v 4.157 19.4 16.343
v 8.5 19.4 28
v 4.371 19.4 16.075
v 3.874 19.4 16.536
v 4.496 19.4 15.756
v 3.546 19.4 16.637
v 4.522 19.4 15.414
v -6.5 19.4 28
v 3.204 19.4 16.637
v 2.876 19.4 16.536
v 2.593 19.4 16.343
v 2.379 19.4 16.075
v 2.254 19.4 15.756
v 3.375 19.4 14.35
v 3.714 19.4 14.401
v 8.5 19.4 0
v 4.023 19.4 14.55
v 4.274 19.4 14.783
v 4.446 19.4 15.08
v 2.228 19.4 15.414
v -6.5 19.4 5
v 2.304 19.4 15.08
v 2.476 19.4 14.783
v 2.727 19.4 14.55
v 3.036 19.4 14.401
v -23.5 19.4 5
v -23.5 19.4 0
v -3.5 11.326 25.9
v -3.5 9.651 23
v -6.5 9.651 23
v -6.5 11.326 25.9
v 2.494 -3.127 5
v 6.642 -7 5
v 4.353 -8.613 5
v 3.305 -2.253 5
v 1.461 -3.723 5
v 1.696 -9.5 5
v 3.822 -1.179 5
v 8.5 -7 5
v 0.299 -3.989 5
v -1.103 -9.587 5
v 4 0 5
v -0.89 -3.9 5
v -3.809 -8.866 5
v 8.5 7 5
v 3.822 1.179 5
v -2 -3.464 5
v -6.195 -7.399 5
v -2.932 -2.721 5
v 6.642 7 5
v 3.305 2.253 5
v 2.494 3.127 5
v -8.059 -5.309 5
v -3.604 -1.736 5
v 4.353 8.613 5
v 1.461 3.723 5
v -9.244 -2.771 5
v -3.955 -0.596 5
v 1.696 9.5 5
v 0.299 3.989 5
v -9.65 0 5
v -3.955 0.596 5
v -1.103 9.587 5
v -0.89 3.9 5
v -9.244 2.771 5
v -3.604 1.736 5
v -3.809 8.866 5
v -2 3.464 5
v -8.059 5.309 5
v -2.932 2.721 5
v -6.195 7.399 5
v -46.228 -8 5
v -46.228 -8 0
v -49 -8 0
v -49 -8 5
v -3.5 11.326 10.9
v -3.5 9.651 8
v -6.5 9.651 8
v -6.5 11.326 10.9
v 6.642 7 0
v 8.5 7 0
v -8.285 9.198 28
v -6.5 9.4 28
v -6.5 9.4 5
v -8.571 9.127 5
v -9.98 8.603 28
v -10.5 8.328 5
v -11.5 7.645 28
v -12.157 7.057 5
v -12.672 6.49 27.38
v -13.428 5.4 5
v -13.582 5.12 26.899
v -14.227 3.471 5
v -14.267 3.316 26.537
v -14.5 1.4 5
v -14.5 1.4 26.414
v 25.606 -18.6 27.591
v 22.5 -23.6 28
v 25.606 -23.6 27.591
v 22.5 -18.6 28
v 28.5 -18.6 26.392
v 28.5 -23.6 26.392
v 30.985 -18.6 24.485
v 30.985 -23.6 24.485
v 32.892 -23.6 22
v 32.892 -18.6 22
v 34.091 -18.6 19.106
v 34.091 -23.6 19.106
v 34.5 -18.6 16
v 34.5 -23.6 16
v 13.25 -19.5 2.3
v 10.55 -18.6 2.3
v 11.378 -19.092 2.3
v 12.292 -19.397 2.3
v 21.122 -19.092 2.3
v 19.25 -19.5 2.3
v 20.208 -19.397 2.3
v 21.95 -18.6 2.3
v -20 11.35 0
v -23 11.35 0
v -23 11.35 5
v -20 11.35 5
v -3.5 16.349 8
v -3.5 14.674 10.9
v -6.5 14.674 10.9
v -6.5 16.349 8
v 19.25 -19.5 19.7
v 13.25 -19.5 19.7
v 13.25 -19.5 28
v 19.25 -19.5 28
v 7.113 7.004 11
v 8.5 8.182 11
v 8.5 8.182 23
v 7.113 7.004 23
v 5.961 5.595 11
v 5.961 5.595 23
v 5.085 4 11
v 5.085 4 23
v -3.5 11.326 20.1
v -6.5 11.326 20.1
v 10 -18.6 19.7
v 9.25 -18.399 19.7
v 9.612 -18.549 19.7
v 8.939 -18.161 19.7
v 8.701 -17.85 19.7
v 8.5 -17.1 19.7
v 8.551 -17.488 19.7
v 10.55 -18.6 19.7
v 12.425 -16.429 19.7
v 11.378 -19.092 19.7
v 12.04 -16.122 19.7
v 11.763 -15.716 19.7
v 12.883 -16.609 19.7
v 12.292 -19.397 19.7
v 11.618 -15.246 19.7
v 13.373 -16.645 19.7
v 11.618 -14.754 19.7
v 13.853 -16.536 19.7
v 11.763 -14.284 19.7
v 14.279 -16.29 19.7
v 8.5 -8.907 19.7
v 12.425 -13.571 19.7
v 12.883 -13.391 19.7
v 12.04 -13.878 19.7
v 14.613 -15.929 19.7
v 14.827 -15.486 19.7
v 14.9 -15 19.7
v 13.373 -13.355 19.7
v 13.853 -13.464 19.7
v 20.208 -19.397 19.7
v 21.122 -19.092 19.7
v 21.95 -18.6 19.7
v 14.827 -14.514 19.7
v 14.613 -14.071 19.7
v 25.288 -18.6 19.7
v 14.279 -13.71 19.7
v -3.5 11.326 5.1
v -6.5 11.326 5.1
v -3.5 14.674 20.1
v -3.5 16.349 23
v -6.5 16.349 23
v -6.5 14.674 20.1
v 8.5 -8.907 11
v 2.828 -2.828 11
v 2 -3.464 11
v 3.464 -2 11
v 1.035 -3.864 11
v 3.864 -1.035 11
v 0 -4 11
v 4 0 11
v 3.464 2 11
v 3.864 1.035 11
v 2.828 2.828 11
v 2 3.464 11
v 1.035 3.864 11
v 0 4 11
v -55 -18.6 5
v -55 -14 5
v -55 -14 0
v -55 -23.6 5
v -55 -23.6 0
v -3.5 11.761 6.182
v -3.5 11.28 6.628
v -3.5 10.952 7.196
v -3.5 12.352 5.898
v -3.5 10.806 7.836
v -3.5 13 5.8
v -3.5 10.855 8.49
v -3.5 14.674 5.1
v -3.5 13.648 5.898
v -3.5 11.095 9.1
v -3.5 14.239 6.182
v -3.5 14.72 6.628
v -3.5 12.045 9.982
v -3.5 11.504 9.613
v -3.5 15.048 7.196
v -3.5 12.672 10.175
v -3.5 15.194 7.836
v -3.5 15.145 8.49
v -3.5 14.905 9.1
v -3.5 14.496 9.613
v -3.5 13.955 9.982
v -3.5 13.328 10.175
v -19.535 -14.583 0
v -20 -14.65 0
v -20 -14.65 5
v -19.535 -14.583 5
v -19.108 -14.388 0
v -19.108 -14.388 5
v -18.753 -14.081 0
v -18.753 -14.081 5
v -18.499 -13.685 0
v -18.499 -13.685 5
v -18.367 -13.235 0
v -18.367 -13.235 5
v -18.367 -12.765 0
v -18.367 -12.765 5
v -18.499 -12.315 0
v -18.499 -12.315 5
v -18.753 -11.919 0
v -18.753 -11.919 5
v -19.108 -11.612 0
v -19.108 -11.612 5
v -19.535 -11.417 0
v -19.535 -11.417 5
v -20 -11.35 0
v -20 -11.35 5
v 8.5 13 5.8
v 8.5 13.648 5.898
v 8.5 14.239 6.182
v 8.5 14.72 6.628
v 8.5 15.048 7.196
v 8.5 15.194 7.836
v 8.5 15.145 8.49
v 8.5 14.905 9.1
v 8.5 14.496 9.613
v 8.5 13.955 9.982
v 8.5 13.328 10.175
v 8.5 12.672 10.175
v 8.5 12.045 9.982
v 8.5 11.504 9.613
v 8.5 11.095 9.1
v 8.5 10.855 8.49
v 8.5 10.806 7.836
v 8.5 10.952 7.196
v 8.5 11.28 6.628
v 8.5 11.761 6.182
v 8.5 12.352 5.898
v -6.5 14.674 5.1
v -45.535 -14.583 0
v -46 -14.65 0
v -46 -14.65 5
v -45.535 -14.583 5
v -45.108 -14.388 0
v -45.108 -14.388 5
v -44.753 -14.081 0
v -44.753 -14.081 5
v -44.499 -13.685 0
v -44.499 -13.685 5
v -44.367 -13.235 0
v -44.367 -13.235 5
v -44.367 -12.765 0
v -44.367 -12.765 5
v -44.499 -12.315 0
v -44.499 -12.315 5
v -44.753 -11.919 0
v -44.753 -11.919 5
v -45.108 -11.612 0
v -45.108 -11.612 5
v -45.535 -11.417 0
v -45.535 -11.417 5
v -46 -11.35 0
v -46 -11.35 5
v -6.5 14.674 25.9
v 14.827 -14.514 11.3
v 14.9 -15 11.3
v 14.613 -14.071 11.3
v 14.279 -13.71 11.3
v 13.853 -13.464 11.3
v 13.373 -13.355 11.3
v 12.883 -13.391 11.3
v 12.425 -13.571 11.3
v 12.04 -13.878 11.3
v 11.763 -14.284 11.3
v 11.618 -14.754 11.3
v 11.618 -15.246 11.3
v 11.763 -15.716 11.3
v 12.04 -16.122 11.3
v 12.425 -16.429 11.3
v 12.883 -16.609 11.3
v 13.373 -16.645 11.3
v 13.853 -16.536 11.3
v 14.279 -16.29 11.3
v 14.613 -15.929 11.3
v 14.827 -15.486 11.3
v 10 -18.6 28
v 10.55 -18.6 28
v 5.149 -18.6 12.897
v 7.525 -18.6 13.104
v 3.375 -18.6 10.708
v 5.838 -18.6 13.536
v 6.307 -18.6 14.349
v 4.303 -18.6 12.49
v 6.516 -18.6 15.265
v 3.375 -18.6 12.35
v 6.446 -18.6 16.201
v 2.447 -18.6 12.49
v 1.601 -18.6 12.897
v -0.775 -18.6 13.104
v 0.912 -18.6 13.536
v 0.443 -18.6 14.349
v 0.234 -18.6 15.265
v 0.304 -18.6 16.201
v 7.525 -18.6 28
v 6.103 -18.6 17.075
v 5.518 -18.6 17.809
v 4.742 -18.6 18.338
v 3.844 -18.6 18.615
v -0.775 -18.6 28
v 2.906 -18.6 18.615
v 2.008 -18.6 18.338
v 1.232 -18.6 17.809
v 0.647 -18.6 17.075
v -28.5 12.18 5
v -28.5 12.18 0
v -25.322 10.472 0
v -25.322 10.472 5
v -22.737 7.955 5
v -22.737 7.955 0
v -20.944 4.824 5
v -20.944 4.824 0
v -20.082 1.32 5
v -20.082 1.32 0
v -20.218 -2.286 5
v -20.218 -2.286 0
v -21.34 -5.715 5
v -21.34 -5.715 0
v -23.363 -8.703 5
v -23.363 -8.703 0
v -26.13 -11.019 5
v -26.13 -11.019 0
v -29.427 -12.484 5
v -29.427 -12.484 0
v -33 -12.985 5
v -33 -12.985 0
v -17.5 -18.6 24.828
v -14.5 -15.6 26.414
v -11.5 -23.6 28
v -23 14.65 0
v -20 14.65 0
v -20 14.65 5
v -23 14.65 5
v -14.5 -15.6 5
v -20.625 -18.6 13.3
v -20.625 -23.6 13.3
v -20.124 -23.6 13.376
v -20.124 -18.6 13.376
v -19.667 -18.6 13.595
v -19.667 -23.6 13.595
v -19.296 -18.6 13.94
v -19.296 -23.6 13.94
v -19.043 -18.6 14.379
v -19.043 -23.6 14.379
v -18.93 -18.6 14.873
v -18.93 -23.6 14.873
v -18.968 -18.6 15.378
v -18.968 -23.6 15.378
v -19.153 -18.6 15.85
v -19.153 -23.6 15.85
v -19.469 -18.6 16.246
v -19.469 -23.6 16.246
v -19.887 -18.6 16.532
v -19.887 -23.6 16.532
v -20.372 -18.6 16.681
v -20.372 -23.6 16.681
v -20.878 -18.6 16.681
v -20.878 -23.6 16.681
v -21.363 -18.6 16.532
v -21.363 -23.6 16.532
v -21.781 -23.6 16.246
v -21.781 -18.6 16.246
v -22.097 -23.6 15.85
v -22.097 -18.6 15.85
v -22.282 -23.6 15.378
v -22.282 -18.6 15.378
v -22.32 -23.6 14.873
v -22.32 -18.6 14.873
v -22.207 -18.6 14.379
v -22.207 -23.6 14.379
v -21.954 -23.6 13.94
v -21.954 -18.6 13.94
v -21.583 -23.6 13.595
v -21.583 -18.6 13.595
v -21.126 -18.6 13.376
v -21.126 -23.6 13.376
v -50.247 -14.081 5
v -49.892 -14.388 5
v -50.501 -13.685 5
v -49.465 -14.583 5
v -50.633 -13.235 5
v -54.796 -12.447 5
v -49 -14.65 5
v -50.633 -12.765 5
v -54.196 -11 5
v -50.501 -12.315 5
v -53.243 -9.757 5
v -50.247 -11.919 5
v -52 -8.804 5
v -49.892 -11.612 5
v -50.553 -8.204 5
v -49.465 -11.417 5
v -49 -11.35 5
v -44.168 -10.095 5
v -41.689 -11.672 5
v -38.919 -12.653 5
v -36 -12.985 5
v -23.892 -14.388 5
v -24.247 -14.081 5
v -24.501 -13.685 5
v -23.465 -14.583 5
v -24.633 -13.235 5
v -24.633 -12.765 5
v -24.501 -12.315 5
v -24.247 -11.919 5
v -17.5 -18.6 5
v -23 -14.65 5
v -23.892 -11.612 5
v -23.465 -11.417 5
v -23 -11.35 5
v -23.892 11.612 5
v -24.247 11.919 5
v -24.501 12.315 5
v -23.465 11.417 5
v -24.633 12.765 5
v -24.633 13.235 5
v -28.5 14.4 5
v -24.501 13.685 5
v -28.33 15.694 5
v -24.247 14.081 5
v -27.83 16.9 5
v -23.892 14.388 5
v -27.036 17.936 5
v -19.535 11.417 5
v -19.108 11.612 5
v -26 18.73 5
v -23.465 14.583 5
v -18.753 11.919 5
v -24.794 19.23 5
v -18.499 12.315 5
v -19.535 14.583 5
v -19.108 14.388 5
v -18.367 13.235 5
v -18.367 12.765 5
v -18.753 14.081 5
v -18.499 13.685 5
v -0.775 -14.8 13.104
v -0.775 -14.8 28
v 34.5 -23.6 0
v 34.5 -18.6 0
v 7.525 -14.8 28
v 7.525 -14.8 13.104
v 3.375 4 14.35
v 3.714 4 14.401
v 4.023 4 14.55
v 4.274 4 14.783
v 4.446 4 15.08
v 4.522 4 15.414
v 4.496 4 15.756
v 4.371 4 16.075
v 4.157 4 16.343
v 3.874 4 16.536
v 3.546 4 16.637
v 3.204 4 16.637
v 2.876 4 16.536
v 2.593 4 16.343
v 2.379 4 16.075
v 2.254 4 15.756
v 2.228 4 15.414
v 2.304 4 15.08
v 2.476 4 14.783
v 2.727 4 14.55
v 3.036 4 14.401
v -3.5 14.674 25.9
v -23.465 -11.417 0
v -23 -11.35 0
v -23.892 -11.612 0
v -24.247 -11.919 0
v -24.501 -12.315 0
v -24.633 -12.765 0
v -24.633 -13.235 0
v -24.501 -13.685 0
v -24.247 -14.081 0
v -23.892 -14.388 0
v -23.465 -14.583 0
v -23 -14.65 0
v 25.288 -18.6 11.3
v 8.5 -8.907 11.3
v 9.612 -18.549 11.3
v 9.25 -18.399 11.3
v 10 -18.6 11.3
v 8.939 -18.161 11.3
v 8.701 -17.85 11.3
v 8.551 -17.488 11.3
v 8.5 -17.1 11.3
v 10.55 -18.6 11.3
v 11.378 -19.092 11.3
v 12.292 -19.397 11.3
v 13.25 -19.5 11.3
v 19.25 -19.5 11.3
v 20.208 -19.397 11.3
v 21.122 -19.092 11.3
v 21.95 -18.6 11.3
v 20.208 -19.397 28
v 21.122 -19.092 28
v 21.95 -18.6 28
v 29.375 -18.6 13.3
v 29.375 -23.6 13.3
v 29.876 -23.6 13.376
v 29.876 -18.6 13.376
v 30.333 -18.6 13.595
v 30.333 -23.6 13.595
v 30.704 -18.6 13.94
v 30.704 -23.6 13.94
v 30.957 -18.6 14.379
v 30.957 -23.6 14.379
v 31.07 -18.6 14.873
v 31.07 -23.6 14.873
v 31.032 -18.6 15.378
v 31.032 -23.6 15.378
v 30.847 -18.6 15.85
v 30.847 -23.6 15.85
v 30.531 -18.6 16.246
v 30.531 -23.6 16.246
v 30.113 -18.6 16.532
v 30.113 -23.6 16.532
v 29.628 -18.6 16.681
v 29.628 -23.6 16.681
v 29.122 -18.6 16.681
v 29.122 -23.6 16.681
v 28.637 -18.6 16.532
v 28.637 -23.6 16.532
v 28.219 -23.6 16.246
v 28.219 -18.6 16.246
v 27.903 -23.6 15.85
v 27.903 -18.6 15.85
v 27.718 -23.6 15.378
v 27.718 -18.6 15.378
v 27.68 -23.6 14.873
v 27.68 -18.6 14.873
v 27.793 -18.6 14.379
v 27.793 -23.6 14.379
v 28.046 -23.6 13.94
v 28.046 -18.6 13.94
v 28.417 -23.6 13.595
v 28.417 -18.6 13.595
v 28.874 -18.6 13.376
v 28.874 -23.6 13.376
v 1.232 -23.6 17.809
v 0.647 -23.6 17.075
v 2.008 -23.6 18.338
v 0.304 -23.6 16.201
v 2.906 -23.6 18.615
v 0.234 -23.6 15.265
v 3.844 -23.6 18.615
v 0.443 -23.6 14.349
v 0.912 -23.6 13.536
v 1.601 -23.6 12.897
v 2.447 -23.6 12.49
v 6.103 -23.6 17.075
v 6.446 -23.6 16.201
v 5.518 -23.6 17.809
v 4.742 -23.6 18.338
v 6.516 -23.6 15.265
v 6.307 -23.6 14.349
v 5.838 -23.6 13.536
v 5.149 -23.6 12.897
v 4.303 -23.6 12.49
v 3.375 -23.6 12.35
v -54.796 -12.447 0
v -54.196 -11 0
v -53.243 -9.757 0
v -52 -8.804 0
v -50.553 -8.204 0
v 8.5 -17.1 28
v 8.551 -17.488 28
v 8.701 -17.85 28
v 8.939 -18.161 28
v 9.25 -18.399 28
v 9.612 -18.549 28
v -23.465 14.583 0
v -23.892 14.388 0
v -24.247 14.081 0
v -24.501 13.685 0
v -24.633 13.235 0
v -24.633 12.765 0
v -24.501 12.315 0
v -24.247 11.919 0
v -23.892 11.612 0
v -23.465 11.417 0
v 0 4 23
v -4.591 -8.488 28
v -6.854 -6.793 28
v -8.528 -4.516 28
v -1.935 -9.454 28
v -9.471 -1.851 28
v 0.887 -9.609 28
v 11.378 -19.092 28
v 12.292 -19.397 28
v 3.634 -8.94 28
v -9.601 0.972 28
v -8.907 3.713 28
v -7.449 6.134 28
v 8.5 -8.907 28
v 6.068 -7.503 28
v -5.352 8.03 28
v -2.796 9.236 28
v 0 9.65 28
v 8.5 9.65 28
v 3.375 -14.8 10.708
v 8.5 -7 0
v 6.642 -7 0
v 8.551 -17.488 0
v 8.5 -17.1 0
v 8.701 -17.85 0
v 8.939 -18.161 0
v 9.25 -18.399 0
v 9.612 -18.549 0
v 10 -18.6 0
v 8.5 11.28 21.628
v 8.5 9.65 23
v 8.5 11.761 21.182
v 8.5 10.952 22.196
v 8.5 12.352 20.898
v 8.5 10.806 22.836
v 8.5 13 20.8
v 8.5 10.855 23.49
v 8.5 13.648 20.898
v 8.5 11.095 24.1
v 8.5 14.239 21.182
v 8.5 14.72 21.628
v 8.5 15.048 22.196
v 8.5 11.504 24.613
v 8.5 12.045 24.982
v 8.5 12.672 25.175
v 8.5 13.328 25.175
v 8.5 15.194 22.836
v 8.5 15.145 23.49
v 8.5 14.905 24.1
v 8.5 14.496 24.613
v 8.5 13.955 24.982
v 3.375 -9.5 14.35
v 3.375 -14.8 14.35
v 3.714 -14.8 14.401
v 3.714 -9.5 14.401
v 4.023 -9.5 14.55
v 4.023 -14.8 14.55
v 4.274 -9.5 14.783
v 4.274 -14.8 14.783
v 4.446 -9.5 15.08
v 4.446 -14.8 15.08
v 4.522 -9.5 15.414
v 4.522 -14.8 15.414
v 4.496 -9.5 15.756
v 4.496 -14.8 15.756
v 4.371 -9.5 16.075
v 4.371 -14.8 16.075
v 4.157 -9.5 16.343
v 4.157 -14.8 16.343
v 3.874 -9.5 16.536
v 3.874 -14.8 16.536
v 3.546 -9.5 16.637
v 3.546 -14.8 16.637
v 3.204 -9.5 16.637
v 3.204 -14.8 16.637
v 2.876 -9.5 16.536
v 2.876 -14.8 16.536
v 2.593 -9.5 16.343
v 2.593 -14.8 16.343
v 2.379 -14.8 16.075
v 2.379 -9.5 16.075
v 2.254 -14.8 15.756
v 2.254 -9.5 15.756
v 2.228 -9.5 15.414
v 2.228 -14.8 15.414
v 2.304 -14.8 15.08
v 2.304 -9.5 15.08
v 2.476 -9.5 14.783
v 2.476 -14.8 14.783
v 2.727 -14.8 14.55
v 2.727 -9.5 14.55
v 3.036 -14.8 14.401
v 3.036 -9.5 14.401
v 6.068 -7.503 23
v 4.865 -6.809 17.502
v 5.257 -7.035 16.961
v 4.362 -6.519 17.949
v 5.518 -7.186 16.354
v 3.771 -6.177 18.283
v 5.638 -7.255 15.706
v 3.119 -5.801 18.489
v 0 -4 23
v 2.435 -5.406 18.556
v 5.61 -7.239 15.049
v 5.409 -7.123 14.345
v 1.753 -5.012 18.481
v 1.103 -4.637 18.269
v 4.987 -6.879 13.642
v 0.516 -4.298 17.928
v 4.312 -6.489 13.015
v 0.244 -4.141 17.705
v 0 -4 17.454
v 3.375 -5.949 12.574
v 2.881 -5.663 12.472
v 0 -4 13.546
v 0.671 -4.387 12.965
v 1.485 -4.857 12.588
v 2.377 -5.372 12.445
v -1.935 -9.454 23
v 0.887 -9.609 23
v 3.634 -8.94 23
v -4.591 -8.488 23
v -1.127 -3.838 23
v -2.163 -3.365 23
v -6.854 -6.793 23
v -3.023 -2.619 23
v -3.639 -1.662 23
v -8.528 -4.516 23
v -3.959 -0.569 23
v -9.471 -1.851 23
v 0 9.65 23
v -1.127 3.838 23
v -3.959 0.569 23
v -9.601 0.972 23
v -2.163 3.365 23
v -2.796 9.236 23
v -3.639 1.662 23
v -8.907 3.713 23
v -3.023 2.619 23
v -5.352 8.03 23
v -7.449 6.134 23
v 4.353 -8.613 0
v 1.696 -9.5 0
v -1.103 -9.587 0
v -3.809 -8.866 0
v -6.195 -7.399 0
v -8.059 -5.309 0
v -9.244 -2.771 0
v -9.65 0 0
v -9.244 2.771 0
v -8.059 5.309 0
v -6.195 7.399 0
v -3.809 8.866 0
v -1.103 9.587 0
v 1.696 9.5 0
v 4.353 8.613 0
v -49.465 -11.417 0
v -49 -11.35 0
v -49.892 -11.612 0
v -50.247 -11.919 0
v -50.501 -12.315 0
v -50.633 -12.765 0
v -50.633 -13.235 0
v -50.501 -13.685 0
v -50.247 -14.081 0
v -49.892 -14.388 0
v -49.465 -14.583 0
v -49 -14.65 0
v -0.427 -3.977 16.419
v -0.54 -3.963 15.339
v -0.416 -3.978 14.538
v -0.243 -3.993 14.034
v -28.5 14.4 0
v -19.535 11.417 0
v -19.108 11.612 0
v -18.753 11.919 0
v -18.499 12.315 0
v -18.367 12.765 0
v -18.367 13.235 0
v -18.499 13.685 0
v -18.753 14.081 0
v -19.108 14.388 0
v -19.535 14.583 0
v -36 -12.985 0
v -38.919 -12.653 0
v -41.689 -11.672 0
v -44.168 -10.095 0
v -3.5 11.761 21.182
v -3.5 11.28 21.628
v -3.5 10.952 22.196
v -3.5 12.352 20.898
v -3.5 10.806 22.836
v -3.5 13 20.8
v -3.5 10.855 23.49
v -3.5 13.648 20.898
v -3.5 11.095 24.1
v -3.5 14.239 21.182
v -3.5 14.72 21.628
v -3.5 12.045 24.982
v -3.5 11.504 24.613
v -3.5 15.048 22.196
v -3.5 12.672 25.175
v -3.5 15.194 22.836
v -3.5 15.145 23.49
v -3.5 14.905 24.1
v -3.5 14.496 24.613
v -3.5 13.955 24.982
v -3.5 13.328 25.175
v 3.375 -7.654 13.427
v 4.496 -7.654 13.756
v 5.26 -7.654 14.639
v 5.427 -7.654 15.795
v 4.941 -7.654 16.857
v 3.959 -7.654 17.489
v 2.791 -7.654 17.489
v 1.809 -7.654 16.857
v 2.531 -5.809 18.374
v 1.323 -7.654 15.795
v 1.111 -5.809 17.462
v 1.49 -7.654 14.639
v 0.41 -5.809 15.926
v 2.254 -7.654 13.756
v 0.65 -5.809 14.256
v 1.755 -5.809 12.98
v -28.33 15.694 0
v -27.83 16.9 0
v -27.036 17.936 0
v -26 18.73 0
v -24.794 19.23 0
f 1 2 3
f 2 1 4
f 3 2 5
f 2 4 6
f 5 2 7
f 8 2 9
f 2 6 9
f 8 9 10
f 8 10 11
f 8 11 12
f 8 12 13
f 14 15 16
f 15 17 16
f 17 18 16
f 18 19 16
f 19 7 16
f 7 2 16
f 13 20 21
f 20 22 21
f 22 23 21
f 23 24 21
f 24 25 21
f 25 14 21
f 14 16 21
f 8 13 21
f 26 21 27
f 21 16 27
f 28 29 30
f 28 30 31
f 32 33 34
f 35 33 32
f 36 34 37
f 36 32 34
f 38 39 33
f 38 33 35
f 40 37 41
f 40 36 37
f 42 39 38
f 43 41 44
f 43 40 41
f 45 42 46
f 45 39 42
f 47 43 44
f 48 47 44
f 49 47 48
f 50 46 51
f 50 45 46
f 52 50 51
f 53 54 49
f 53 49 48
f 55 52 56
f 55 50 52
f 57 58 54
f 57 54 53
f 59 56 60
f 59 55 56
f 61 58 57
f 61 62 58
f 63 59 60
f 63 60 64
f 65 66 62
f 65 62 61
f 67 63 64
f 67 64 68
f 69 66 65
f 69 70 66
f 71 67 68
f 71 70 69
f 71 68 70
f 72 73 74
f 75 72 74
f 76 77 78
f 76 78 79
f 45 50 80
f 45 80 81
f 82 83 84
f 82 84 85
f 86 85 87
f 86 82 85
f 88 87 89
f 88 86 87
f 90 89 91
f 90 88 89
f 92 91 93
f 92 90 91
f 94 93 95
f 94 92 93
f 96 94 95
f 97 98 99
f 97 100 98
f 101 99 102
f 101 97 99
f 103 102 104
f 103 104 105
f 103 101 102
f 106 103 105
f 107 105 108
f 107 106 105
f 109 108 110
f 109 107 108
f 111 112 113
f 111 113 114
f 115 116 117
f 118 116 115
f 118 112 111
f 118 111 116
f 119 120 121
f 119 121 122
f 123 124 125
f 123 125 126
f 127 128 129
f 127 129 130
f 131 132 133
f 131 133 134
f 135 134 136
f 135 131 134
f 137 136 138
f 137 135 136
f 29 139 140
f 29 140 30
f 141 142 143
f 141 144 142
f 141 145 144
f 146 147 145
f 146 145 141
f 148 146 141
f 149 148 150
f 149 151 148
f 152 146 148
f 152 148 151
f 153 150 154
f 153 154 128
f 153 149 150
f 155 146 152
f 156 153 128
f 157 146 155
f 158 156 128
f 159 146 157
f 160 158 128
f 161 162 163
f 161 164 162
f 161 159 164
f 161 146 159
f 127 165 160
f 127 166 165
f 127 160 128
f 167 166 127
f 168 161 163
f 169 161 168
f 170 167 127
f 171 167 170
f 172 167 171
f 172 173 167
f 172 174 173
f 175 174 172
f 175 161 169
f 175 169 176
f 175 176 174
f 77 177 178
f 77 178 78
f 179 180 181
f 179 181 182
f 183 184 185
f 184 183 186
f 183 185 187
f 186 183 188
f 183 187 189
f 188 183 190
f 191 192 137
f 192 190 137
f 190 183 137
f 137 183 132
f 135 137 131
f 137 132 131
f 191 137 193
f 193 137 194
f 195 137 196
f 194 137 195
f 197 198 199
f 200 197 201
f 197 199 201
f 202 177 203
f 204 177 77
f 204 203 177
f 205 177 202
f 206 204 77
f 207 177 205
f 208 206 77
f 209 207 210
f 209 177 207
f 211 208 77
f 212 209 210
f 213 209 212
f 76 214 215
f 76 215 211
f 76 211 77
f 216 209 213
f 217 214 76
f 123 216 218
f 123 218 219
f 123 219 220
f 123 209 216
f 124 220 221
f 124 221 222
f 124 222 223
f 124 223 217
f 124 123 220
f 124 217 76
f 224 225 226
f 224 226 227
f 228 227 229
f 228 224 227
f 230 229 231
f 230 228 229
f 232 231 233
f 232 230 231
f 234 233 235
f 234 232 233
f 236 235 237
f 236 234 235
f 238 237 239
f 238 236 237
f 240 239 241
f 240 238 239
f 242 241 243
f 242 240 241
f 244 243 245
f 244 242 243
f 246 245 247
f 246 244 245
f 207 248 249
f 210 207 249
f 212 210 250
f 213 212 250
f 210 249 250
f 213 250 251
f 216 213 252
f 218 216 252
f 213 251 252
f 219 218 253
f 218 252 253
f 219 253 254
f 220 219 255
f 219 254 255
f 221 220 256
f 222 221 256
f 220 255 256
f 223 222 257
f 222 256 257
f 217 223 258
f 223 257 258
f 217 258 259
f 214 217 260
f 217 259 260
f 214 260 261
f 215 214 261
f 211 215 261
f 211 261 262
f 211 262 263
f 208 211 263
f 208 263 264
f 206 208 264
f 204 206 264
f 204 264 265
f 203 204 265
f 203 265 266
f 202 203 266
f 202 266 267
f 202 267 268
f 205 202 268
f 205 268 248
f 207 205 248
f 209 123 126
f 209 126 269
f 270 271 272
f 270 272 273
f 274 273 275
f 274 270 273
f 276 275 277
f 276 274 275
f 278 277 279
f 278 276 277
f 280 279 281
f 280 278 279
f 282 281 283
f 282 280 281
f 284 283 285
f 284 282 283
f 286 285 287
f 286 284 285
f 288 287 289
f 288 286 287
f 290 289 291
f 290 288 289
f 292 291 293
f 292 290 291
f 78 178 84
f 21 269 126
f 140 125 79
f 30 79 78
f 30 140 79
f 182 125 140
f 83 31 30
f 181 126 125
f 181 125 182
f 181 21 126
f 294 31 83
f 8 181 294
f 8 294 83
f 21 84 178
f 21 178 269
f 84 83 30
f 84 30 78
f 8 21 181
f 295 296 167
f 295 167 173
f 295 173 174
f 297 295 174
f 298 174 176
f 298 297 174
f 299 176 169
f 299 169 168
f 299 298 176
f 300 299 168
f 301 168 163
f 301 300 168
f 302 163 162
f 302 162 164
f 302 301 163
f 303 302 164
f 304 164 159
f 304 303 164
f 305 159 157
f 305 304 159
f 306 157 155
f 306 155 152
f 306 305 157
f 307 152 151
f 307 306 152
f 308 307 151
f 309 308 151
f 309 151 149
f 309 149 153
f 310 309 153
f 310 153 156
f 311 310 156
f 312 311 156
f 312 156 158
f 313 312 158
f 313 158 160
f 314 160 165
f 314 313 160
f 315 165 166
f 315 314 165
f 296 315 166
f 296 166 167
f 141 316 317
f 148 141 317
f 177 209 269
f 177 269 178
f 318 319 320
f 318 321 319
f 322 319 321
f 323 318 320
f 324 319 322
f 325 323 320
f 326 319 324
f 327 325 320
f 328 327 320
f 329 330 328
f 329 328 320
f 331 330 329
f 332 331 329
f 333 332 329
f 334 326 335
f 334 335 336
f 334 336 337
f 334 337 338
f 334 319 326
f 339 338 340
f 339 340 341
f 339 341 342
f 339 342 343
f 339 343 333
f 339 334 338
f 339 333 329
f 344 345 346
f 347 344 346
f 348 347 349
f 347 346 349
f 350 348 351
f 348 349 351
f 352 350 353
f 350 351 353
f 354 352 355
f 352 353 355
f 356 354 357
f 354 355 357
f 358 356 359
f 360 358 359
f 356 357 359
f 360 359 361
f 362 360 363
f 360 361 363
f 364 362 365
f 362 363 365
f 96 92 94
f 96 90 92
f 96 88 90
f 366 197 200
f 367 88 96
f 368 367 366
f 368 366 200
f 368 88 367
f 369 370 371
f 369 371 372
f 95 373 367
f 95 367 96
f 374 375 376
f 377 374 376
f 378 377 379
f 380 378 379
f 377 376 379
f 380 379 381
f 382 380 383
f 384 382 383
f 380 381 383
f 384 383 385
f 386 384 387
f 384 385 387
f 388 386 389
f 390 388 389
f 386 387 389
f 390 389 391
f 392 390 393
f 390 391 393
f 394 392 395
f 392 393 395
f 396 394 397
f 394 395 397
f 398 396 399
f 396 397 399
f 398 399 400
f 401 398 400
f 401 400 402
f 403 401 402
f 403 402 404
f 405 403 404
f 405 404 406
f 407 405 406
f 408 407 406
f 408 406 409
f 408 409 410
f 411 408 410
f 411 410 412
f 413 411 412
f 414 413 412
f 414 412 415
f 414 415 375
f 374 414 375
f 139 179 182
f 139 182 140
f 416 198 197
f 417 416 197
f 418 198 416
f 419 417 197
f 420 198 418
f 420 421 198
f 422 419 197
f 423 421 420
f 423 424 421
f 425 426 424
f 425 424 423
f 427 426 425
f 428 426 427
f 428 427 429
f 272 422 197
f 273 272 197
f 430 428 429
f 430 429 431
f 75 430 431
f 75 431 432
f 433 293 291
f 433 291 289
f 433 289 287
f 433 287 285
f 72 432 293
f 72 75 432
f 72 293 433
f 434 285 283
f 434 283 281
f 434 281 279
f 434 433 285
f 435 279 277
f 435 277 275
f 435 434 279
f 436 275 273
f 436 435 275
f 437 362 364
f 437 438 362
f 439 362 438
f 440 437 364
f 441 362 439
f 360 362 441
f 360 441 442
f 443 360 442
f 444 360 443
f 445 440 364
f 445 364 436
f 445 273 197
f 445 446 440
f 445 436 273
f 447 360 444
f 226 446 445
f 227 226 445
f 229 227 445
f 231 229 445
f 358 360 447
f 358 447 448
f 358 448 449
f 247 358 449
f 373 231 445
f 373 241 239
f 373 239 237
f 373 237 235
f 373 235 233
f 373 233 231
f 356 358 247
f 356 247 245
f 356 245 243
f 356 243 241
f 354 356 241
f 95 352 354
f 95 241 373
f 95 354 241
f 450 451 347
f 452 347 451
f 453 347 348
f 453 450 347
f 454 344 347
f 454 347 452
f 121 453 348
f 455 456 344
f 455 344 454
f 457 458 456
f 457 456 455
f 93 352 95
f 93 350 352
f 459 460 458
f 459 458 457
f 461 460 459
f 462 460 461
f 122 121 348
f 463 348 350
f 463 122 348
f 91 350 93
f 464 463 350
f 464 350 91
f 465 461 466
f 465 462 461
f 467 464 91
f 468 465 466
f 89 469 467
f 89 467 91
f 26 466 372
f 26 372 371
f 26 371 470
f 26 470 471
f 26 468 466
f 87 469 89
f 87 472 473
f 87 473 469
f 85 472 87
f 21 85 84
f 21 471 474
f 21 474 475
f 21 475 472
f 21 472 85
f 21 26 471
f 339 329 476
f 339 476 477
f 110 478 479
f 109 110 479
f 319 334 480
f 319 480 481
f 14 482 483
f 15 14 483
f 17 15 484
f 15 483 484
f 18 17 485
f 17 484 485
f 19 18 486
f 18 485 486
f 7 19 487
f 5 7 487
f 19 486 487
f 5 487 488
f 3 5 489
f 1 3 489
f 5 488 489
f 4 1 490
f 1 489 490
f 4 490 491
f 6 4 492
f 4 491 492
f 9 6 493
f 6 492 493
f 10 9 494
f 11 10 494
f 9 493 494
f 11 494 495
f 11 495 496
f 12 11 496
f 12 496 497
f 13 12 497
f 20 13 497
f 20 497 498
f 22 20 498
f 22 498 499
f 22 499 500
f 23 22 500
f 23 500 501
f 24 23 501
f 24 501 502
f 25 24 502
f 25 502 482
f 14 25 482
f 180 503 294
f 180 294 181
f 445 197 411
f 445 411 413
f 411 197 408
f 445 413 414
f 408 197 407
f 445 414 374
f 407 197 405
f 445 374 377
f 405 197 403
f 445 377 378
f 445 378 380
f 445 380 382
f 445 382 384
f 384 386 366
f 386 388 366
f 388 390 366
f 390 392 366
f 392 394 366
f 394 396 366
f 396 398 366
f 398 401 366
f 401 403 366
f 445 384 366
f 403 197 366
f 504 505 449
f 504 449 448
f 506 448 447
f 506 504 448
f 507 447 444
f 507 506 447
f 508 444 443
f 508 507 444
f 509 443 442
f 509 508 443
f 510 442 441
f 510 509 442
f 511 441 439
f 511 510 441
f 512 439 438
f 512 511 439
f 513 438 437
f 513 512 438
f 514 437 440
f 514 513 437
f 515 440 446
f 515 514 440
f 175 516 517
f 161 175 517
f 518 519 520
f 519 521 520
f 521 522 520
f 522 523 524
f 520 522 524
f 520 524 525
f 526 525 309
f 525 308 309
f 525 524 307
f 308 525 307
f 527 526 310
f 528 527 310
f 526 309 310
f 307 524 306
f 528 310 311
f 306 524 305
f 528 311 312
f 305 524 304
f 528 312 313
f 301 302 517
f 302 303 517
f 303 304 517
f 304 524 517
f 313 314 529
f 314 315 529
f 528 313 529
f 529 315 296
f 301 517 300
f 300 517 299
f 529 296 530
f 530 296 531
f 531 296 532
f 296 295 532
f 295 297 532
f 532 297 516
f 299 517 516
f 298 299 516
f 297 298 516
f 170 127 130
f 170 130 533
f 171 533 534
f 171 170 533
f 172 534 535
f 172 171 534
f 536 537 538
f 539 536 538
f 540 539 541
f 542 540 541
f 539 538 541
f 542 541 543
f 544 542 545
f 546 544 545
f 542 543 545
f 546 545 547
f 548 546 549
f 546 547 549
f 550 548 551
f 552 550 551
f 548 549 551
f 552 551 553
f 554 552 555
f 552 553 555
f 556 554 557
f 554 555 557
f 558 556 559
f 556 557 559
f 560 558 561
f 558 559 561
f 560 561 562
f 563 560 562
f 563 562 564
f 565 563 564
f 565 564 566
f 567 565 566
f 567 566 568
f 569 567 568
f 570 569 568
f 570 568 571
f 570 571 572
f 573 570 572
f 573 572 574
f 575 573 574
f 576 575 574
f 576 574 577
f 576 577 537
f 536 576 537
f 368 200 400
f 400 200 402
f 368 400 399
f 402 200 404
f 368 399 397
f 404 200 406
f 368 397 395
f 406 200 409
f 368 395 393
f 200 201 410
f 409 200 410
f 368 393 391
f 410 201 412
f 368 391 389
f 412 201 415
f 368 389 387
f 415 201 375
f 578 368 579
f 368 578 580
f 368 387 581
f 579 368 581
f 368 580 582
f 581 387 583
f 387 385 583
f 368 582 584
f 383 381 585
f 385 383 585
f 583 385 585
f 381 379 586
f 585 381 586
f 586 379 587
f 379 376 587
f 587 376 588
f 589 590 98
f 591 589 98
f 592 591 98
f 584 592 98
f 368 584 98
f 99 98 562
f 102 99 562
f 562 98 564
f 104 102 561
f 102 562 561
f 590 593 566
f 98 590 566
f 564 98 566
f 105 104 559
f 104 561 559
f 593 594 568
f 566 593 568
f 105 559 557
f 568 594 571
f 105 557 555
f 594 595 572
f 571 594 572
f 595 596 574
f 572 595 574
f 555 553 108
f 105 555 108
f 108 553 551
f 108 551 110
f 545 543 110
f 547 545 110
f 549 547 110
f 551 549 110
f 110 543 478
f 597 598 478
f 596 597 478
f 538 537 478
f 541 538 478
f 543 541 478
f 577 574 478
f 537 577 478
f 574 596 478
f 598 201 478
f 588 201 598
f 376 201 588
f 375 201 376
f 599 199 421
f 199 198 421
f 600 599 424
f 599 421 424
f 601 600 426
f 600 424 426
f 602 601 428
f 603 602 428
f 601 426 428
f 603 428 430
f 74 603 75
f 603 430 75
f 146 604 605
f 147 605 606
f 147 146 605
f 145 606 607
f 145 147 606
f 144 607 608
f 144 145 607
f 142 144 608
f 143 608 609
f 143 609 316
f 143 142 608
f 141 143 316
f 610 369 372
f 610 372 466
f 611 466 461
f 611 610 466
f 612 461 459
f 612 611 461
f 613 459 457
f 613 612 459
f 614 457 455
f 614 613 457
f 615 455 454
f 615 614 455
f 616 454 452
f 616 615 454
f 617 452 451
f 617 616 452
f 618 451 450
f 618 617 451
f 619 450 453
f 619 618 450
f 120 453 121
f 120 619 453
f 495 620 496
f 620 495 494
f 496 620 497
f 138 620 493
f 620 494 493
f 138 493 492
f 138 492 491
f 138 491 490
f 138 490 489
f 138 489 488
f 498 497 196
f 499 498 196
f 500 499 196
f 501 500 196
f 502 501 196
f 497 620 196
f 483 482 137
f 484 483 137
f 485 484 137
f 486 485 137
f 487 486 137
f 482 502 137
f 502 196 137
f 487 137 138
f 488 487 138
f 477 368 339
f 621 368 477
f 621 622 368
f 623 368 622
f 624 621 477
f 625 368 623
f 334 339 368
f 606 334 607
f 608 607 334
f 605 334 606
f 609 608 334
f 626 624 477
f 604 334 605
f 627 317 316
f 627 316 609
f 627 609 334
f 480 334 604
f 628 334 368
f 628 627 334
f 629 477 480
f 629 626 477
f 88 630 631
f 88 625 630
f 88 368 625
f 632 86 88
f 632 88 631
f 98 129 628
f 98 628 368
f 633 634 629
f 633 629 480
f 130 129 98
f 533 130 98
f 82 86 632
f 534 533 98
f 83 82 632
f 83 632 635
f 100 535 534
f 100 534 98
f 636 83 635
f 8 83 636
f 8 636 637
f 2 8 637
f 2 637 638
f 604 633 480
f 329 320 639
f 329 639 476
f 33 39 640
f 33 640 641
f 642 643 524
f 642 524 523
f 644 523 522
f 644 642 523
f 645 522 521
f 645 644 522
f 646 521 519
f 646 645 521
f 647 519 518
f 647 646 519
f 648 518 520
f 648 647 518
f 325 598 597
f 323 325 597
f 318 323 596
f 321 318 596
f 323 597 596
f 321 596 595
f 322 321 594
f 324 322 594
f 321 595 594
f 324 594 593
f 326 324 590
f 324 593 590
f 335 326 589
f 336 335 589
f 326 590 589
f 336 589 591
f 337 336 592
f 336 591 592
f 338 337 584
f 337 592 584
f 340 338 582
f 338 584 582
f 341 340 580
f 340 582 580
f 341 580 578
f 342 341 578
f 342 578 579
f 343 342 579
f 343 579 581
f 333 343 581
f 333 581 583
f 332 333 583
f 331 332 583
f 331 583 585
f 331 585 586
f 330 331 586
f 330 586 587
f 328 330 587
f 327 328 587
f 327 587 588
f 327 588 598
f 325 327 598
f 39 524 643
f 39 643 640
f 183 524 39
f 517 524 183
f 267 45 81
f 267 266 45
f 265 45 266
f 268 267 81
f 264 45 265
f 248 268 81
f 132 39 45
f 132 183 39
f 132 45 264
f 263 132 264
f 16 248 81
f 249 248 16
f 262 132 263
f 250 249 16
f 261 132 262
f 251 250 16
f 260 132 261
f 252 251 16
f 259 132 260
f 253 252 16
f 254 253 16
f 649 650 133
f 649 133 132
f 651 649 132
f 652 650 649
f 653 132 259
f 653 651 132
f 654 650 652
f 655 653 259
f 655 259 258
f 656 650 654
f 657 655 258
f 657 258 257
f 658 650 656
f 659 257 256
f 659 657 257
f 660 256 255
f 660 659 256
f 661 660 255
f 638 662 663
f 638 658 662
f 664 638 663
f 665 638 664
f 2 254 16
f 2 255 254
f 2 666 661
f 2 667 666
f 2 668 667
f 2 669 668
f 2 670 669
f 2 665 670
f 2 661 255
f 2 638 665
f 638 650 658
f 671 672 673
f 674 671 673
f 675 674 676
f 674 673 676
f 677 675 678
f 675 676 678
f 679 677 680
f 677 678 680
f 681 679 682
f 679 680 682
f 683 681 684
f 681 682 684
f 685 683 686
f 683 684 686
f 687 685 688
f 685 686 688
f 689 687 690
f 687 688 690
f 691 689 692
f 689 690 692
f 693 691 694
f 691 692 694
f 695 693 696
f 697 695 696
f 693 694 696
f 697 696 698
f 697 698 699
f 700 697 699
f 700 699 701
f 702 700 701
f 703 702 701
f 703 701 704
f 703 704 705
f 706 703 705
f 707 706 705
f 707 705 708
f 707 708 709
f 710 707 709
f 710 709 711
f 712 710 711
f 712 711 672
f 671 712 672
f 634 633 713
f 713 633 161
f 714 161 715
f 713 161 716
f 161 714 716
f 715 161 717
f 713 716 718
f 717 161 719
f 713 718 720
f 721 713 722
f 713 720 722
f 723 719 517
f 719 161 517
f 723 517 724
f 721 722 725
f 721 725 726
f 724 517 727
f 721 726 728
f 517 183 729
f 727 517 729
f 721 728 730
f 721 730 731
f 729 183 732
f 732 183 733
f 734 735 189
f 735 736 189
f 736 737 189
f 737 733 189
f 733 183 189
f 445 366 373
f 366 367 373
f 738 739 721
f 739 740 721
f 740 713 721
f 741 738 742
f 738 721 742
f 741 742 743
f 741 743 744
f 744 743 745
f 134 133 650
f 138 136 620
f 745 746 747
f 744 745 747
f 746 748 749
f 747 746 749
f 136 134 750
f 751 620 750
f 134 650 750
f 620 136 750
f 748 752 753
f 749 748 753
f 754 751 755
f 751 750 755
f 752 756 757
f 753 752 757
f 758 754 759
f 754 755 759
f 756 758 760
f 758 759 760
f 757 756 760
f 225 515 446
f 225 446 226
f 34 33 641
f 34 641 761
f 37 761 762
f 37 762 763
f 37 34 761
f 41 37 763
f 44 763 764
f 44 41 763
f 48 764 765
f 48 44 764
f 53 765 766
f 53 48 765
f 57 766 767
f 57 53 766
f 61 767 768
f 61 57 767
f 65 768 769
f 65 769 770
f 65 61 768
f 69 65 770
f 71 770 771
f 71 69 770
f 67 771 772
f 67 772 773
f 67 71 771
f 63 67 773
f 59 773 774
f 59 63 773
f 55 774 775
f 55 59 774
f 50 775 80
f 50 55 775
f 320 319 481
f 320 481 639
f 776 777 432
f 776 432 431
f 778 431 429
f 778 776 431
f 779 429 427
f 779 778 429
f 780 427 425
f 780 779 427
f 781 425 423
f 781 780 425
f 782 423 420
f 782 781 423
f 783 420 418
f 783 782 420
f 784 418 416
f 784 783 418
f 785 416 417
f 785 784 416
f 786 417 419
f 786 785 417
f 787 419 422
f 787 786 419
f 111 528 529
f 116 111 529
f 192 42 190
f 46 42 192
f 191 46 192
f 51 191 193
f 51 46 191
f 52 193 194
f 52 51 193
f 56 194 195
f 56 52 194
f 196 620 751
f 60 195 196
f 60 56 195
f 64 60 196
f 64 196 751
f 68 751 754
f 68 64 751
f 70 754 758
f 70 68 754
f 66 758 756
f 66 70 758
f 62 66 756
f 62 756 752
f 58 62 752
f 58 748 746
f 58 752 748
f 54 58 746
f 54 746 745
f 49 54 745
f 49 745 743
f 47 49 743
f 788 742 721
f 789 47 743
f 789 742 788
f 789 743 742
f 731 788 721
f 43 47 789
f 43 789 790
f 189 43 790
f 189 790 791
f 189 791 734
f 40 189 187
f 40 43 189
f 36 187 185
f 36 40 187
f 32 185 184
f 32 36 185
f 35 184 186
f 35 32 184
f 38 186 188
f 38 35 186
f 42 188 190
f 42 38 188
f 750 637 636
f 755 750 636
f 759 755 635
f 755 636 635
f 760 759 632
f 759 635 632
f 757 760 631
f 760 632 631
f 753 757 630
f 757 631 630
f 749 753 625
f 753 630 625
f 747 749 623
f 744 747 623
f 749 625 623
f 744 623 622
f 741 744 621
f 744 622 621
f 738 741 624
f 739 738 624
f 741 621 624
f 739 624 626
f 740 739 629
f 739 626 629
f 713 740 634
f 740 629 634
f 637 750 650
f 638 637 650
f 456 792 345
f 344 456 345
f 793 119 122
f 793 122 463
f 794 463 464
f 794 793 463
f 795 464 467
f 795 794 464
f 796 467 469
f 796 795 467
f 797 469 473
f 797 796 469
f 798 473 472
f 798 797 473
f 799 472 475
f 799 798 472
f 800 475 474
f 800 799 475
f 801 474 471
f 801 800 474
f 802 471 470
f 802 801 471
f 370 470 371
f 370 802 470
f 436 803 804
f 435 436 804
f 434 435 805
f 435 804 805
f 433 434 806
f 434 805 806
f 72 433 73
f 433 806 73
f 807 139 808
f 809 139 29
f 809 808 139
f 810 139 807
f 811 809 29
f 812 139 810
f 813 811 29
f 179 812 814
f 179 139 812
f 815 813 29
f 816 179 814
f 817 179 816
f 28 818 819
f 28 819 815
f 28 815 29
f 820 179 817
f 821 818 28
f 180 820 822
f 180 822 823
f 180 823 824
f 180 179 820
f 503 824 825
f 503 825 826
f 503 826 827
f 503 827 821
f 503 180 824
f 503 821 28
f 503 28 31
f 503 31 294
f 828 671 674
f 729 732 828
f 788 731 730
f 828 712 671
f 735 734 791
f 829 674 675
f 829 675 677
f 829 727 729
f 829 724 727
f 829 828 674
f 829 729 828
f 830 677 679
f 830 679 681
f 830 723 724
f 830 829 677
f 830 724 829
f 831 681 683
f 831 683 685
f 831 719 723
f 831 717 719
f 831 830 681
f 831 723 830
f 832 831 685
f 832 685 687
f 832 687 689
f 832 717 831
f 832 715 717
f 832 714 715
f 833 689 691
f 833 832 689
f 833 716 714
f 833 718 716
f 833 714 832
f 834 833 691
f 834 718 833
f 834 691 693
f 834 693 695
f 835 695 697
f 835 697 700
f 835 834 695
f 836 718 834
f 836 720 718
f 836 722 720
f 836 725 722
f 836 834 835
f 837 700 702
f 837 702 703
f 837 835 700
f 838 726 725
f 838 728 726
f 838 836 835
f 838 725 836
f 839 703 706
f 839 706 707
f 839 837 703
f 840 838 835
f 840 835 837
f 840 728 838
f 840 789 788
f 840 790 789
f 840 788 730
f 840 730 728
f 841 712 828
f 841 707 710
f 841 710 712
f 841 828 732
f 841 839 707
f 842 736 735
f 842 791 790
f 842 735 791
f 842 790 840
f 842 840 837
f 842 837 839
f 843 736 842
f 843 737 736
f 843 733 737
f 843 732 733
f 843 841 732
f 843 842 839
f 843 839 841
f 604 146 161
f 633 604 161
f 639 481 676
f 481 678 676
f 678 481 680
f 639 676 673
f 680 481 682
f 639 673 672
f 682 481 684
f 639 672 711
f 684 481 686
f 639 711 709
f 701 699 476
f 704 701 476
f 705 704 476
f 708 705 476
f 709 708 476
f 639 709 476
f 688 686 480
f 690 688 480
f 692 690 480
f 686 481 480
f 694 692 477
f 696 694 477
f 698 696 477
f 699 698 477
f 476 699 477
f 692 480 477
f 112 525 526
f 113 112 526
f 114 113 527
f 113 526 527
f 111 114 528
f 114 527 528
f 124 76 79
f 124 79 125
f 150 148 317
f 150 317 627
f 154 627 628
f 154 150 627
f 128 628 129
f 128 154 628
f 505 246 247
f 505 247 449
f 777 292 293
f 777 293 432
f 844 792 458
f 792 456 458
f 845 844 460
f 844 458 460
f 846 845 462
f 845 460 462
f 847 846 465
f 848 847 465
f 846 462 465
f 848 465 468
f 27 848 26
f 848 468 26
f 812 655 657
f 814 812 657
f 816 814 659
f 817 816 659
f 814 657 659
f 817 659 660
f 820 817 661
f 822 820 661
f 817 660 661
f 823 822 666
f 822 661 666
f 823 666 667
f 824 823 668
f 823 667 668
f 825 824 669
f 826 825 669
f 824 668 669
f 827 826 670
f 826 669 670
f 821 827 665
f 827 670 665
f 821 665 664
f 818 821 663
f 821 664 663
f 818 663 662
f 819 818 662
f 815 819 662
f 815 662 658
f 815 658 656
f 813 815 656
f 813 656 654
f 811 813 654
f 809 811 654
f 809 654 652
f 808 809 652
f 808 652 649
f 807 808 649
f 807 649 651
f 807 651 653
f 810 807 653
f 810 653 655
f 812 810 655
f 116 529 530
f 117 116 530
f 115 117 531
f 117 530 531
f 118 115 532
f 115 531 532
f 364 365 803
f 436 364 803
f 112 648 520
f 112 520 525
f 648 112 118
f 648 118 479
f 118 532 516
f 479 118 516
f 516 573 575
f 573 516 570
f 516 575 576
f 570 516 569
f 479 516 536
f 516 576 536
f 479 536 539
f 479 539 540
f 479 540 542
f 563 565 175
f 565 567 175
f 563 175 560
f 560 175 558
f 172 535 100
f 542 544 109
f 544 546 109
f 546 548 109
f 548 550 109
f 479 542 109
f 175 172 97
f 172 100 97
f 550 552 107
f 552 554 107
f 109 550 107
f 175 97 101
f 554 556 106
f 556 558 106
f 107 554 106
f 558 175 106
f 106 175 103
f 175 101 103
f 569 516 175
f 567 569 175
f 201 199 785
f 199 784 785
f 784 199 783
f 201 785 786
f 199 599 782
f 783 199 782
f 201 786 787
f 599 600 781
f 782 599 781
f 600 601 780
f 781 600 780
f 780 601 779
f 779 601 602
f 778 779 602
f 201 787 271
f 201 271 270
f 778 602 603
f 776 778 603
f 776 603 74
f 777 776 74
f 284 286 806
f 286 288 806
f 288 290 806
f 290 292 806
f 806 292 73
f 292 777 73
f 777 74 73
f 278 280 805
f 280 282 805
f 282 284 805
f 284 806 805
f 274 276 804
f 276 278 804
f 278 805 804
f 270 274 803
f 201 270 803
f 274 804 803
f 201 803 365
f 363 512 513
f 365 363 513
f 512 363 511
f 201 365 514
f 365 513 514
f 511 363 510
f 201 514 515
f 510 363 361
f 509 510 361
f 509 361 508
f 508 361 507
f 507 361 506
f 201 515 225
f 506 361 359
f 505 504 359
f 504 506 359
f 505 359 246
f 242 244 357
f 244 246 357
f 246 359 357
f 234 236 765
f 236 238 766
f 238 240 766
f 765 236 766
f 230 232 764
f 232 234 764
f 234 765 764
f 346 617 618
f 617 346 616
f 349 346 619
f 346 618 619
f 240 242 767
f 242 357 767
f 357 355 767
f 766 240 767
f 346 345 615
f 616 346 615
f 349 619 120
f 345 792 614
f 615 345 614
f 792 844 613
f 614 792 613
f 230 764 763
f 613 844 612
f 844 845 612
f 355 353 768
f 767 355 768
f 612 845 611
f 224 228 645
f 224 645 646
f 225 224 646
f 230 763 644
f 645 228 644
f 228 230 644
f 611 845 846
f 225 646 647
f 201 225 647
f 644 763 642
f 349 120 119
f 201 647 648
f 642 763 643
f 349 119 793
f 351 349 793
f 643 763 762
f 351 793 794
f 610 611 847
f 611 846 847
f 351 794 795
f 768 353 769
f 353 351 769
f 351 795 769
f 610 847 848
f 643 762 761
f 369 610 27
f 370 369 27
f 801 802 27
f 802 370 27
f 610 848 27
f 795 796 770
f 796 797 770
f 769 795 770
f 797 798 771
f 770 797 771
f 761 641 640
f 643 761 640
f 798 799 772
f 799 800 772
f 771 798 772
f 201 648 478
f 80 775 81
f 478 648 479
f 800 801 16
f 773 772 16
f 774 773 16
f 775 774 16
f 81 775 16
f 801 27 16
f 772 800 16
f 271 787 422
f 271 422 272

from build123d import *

# Parameters (mm, degrees)
SKETCH1_R                = 4
BOSS_EXTRUDE1_DEPTH      = 28
SKETCH2_W                = 40.5
SKETCH2_H                = 38
CUT_EXTRUDE1_DEPTH       = 23
SKETCH3_R                = 9.65
CUT_EXTRUDE2_DEPTH       = 5
SKETCH8_R                = 1.15
CUT_EXTRUDE7_DEPTH       = 76.219678276
SKETCH9_R                = 2.2
CUT_EXTRUDE8_DEPTH       = 97.701654612
CUT_EXTRUDE9_DEPTH       = 3
CUT_EXTRUDE9_DEPTH_BACK  = 11
CHAMFER2_SIZE            = 3
SKETCH16_W               = 26
SKETCH16_H               = 38
CUT_EXTRUDE12_DEPTH      = 67.075411541
CUT_EXTRUDE3_START       = -5
CUT_EXTRUDE3_DEPTH       = 5
FILLET6_R                = 1.5
CUT_EXTRUDE13_START      = -5
CUT_EXTRUDE13_DEPTH      = 5
BOSS_EXTRUDE3_DEPTH      = 4.2
BOSS_EXTRUDE3_DEPTH_BACK = 4.2
SKETCH21_R               = 1.65
SKETCH15_R               = 1.7
CUT_EXTRUDE11_DEPTH      = 76.219678334
CUT_EXTRUDE14_DEPTH      = 9
FILLET1_R                = 5
FILLET2_R                = 6
FILLET4_R                = 12
CUT_EXTRUDE15_DEPTH      = 3.8
CUT_EXTRUDE18_REACH      = 77.22
SKETCH26_R               = 3.15
CUT_EXTRUDE19_START      = -12
CUT_EXTRUDE19_DEPTH      = 12
CUT_EXTRUDE20_DEPTH      = 62.824024457
CUT_EXTRUDE20_DEPTH_BACK = 4.5
SKETCH28_R               = 10
SKETCH29_W               = 23
SKETCH29_H               = 10
CUT_EXTRUDE21_DEPTH      = 8
FILLET7_R                = 8
CHAMFER1_SIZE            = 23
CHAMFER1_SIZE2           = 43.5


with BuildPart() as part:
    # Sketch1 → Boss-Extrude1 (new body)
    with BuildSketch(Plane.XY):
        with BuildLine():
            Line((-55, -23.6), (34.5, -23.6))
            Line((34.5, -23.6), (34.5, 19.4))
            Line((34.5, 19.4), (-28.5, 19.4))
            Line((-28.5, 19.4), (-28.5, 12.180409823))
            ThreePointArc((-28.5, 12.180409823), (-20.217668105, -2.285689125), (-33, -12.985083113))
            Line((-33, -12.985083113), (-36, -12.985083113))
            ThreePointArc((-36, -12.985083113), (-41.689100041, -11.672468641), (-46.228019527, -8))
            Line((-46.228019527, -8), (-55, -8))
            Line((-55, -8), (-55, -23.6))
        make_face()
        Circle(SKETCH1_R, mode=Mode.SUBTRACT)
        with BuildLine():
            Line((-23, 11.35), (-20, 11.35))
            ThreePointArc((-20, 11.35), (-18.35, 13), (-20, 14.65))
            Line((-20, 14.65), (-23, 14.65))
            ThreePointArc((-23, 14.65), (-24.65, 13), (-23, 11.35))
        make_face(mode=Mode.SUBTRACT)
        with BuildLine():
            Line((-23, -14.65), (-20, -14.65))
            ThreePointArc((-20, -14.65), (-18.35, -13), (-20, -11.35))
            Line((-20, -11.35), (-23, -11.35))
            ThreePointArc((-23, -11.35), (-24.65, -13), (-23, -14.65))
        make_face(mode=Mode.SUBTRACT)
        with BuildLine():
            Line((-46, -11.35), (-49, -11.35))
            ThreePointArc((-49, -11.35), (-50.65, -13), (-49, -14.65))
            Line((-49, -14.65), (-46, -14.65))
            ThreePointArc((-46, -14.65), (-44.35, -13), (-46, -11.35))
        make_face(mode=Mode.SUBTRACT)
    extrude(amount=BOSS_EXTRUDE1_DEPTH)

    # Sketch2 → Cut-Extrude1 (cut)
    with BuildSketch(Plane.XY.offset(28)):
        with Locations((-34.75, 0.4)):
            Rectangle(SKETCH2_W, SKETCH2_H)
    extrude(amount=-CUT_EXTRUDE1_DEPTH, mode=Mode.SUBTRACT)

    # Sketch3 → Cut-Extrude2 (cut)
    with BuildSketch(Plane.XY.offset(28)):
        Circle(SKETCH3_R)
    extrude(amount=-CUT_EXTRUDE2_DEPTH, mode=Mode.SUBTRACT)

    # Sketch8 → Cut-Extrude7 (cut, through all)
    with BuildSketch(Plane.XZ.offset(23.6)):
        with Locations(Location((3.375, 15.5, 0), (0, 0, 270))):
            Circle(SKETCH8_R)
    extrude(amount=-CUT_EXTRUDE7_DEPTH, mode=Mode.SUBTRACT)

    # Sketch9 → Cut-Extrude8 (cut, through all)
    with BuildSketch(Plane(origin=(34.5, 0, 0), x_dir=(0, 0, -1), z_dir=(1, 0, 0))):
        with Locations((-8, 13)):
            Circle(SKETCH9_R)
        with Locations((-23, 13)):
            Circle(SKETCH9_R)
    extrude(amount=-CUT_EXTRUDE8_DEPTH, mode=Mode.SUBTRACT)

    # Sketch10 → Cut-Extrude9 (cut, two sides: drawn at the far end of the back side and taken through both)
    with BuildSketch(Plane.ZY.offset(14.5).offset(-CUT_EXTRUDE9_DEPTH_BACK)):
        Polygon((5.1, 14.674315781), (5.1, 11.325684219), (8, 9.651368439), (10.9, 11.325684219), (10.9, 14.674315781), (8, 16.348631561), align=None)
        Polygon((25.9, 11.325684219), (25.9, 14.674315781), (23, 16.348631561), (20.1, 14.674315781), (20.1, 11.325684219), (23, 9.651368439), align=None)
    extrude(amount=CUT_EXTRUDE9_DEPTH + CUT_EXTRUDE9_DEPTH_BACK, mode=Mode.SUBTRACT)

    # Chamfer2
    chamfer2_edges = [part.edges().sort_by_distance(p)[0] for p in [
        (-14.5, -18.6, 16.5),
    ]]
    chamfer(chamfer2_edges, length=CHAMFER2_SIZE)

    # Sketch16 → Cut-Extrude12 (cut, through all)
    with BuildSketch(Plane.XY.offset(28)):
        with Locations((21.5, 0.4)):
            Rectangle(SKETCH16_W, SKETCH16_H)
    extrude(amount=-CUT_EXTRUDE12_DEPTH, mode=Mode.SUBTRACT)

    # Sketch4 → Cut-Extrude3 (cut)
    with BuildSketch(Plane(origin=(0, 0, 0), x_dir=(-1, 0, 0), z_dir=(0, 0, -1)).offset(CUT_EXTRUDE3_START)):
        with BuildLine():
            Line((-36.31147183, -7), (-6.642476948, -7))
            ThreePointArc((-6.642476948, -7), (9.65, 0), (-6.642476948, 7))
            Line((-6.642476948, 7), (-36.31147183, 7))
            Line((-36.31147183, 7), (-36.31147183, -7))
        make_face()
    extrude(amount=CUT_EXTRUDE3_DEPTH, mode=Mode.SUBTRACT)

    # Fillet6
    fillet6_edges = [part.edges().sort_by_distance(p)[0] for p in [
        (8.5, -18.6, 14),
    ]]
    fillet(fillet6_edges, radius=FILLET6_R)

    # Sketch17 → Cut-Extrude13 (cut)
    with BuildSketch(Plane.XY.offset(28).offset(CUT_EXTRUDE13_START)):
        with BuildLine():
            Line((0, 4), (0, 9.65))
            Line((0, 9.65), (8.5, 9.65))
            Line((8.5, 9.65), (8.5, -8.907477288))
            Line((8.5, -8.907477288), (0, -4))
            ThreePointArc((0, -4), (4, 0), (0, 4))
        make_face()
    extrude(amount=CUT_EXTRUDE13_DEPTH, mode=Mode.SUBTRACT)

    # Sketch20 → Cut-Revolve1 (revolve, cut)
    with BuildSketch(Plane.XY.offset(15.5), mode=Mode.PRIVATE) as cut_revolve1_sk:
        Polygon((3.375, -11.8), (7.375, -3.8), (3.375, -3.8), align=None)
    revolve(cut_revolve1_sk.sketch.rotate(Axis((3.375, -3.8, 15.5), (0, -1, 0)), 270), axis=Axis((3.375, -3.8, 15.5), (0, -1, 0)), mode=Mode.SUBTRACT)

    # Sketch21 → Boss-Extrude3 (add, two sides: drawn at the far end of the back side and taken through both)
    with BuildSketch(Plane.XY.offset(15.5).offset(-BOSS_EXTRUDE3_DEPTH_BACK)):
        Polygon((7.25, -8.185789452), (7.25, -18.6), (25.287941791, -18.6), align=None)
        with Locations((13.25, -15)):
            Circle(SKETCH21_R, mode=Mode.SUBTRACT)
    extrude(amount=BOSS_EXTRUDE3_DEPTH + BOSS_EXTRUDE3_DEPTH_BACK)

    # Sketch15 → Cut-Extrude11 (cut, through all)
    with BuildSketch(Plane.XZ.offset(23.6)):
        with Locations(Location((-20.625, 15, 0), (0, 0, 270))):
            Circle(SKETCH15_R)
        with Locations(Location((29.375, 15, 0), (0, 0, 270))):
            Circle(SKETCH15_R)
    extrude(amount=-CUT_EXTRUDE11_DEPTH, mode=Mode.SUBTRACT)

    # Sketch22 → Cut-Extrude14 (cut)
    with BuildSketch(Plane.XY.offset(19.7)):
        with BuildLine():
            Line((13.25, -19.5), (19.25, -19.5))
            ThreePointArc((19.25, -19.5), (23.75, -15), (19.25, -10.5))
            Line((19.25, -10.5), (13.25, -10.5))
            ThreePointArc((13.25, -10.5), (8.75, -15), (13.25, -19.5))
        make_face()
    cut_extrude14 = extrude(amount=CUT_EXTRUDE14_DEPTH, mode=Mode.SUBTRACT)

    # Mirror1: Cut-Extrude14 across plane
    add(cut_extrude14.mirror(Plane.XY.offset(15.5)), mode=Mode.SUBTRACT)

    # Fillet1
    fillet1_edges = [part.edges().sort_by_distance(p)[0] for p in [
        (-28.5, 19.4, 2.5),
    ]]
    fillet(fillet1_edges, radius=FILLET1_R)

    # Fillet2
    fillet2_edges = [part.edges().sort_by_distance(p)[0] for p in [
        (-55, -8, 2.5),
    ]]
    fillet(fillet2_edges, radius=FILLET2_R)

    # Fillet4
    fillet4_edges = [part.edges().sort_by_distance(p)[0] for p in [
        (34.5, -21.1, 28),
    ]]
    fillet(fillet4_edges, radius=FILLET4_R)

    # Sketch23 → Cut-Extrude15 (cut)
    with BuildSketch(Plane.XZ.offset(18.6)):
        Polygon((-0.775, 28.722034997), (7.525, 28.722034997), (7.525, 13.103996383), (3.375, 10.707992766), (-0.775, 13.103996383), align=None)
    extrude(amount=-CUT_EXTRUDE15_DEPTH, mode=Mode.SUBTRACT)

    # Sketch26 → Cut-Extrude18 (cut, up to next)
    with BuildSketch(Plane.XZ.offset(23.6), mode=Mode.PRIVATE) as cut_extrude18_sk1:
        with Locations(Location((3.375, 15.5, 0), (0, 0, 270))):
            Circle(SKETCH26_R)
    cut_extrude18_tool1 = extrude(cut_extrude18_sk1.sketch, amount=-CUT_EXTRUDE18_REACH, mode=Mode.PRIVATE) & part.part
    add(cut_extrude18_tool1.solids().sort_by_distance((3.375, -23.6, 15.5))[0], mode=Mode.SUBTRACT)

    # Sketch27 → Cut-Extrude19 (cut)
    with BuildSketch(Plane.XY.offset(23).offset(CUT_EXTRUDE19_START)):
        with BuildLine():
            Line((8.5, -8.907477288), (0, -4))
            ThreePointArc((0, -4), (-4, 0), (0, 4))
            Line((0, 4), (8.5, 4))
            Line((8.5, 4), (8.5, -8.907477288))
        make_face()
    extrude(amount=CUT_EXTRUDE19_DEPTH, mode=Mode.SUBTRACT)

    # Sketch28 → Cut-Extrude20 (cut, two sides: drawn at the far end of the back side and taken through both)
    with BuildSketch(Plane.XY.offset(15.5).offset(-CUT_EXTRUDE20_DEPTH_BACK)):
        with Locations((14.25, 0)):
            Circle(SKETCH28_R)
    extrude(amount=CUT_EXTRUDE20_DEPTH + CUT_EXTRUDE20_DEPTH_BACK, mode=Mode.SUBTRACT)

    # Sketch29 → Cut-Extrude21 (cut)
    with BuildSketch(Plane.ZY.offset(14.5)):
        with Locations((16.5, 14.4)):
            Rectangle(SKETCH29_W, SKETCH29_H)
    extrude(amount=-CUT_EXTRUDE21_DEPTH, mode=Mode.SUBTRACT)

    # Fillet7
    fillet7_edges = [part.edges().sort_by_distance(p)[0] for p in [
        (-14.5, 9.4, 16.5),
    ]]
    fillet(fillet7_edges, radius=FILLET7_R - 0.0001)  # a hair under: the kernel refuses the full size

    # Chamfer1
    chamfer1_edges = [part.edges().sort_by_distance(p)[0] for p in [
        (-55, -21.1, 28),
    ]]
    chamfer1_side = [part.faces().sort_by_distance(p)[0] for p in [
        (-55, -20.422699387, 12.377300613),
    ]]
    chamfer(chamfer1_edges, length=CHAMFER1_SIZE, length2=CHAMFER1_SIZE2, reference=chamfer1_side[0])


solid = part.part
